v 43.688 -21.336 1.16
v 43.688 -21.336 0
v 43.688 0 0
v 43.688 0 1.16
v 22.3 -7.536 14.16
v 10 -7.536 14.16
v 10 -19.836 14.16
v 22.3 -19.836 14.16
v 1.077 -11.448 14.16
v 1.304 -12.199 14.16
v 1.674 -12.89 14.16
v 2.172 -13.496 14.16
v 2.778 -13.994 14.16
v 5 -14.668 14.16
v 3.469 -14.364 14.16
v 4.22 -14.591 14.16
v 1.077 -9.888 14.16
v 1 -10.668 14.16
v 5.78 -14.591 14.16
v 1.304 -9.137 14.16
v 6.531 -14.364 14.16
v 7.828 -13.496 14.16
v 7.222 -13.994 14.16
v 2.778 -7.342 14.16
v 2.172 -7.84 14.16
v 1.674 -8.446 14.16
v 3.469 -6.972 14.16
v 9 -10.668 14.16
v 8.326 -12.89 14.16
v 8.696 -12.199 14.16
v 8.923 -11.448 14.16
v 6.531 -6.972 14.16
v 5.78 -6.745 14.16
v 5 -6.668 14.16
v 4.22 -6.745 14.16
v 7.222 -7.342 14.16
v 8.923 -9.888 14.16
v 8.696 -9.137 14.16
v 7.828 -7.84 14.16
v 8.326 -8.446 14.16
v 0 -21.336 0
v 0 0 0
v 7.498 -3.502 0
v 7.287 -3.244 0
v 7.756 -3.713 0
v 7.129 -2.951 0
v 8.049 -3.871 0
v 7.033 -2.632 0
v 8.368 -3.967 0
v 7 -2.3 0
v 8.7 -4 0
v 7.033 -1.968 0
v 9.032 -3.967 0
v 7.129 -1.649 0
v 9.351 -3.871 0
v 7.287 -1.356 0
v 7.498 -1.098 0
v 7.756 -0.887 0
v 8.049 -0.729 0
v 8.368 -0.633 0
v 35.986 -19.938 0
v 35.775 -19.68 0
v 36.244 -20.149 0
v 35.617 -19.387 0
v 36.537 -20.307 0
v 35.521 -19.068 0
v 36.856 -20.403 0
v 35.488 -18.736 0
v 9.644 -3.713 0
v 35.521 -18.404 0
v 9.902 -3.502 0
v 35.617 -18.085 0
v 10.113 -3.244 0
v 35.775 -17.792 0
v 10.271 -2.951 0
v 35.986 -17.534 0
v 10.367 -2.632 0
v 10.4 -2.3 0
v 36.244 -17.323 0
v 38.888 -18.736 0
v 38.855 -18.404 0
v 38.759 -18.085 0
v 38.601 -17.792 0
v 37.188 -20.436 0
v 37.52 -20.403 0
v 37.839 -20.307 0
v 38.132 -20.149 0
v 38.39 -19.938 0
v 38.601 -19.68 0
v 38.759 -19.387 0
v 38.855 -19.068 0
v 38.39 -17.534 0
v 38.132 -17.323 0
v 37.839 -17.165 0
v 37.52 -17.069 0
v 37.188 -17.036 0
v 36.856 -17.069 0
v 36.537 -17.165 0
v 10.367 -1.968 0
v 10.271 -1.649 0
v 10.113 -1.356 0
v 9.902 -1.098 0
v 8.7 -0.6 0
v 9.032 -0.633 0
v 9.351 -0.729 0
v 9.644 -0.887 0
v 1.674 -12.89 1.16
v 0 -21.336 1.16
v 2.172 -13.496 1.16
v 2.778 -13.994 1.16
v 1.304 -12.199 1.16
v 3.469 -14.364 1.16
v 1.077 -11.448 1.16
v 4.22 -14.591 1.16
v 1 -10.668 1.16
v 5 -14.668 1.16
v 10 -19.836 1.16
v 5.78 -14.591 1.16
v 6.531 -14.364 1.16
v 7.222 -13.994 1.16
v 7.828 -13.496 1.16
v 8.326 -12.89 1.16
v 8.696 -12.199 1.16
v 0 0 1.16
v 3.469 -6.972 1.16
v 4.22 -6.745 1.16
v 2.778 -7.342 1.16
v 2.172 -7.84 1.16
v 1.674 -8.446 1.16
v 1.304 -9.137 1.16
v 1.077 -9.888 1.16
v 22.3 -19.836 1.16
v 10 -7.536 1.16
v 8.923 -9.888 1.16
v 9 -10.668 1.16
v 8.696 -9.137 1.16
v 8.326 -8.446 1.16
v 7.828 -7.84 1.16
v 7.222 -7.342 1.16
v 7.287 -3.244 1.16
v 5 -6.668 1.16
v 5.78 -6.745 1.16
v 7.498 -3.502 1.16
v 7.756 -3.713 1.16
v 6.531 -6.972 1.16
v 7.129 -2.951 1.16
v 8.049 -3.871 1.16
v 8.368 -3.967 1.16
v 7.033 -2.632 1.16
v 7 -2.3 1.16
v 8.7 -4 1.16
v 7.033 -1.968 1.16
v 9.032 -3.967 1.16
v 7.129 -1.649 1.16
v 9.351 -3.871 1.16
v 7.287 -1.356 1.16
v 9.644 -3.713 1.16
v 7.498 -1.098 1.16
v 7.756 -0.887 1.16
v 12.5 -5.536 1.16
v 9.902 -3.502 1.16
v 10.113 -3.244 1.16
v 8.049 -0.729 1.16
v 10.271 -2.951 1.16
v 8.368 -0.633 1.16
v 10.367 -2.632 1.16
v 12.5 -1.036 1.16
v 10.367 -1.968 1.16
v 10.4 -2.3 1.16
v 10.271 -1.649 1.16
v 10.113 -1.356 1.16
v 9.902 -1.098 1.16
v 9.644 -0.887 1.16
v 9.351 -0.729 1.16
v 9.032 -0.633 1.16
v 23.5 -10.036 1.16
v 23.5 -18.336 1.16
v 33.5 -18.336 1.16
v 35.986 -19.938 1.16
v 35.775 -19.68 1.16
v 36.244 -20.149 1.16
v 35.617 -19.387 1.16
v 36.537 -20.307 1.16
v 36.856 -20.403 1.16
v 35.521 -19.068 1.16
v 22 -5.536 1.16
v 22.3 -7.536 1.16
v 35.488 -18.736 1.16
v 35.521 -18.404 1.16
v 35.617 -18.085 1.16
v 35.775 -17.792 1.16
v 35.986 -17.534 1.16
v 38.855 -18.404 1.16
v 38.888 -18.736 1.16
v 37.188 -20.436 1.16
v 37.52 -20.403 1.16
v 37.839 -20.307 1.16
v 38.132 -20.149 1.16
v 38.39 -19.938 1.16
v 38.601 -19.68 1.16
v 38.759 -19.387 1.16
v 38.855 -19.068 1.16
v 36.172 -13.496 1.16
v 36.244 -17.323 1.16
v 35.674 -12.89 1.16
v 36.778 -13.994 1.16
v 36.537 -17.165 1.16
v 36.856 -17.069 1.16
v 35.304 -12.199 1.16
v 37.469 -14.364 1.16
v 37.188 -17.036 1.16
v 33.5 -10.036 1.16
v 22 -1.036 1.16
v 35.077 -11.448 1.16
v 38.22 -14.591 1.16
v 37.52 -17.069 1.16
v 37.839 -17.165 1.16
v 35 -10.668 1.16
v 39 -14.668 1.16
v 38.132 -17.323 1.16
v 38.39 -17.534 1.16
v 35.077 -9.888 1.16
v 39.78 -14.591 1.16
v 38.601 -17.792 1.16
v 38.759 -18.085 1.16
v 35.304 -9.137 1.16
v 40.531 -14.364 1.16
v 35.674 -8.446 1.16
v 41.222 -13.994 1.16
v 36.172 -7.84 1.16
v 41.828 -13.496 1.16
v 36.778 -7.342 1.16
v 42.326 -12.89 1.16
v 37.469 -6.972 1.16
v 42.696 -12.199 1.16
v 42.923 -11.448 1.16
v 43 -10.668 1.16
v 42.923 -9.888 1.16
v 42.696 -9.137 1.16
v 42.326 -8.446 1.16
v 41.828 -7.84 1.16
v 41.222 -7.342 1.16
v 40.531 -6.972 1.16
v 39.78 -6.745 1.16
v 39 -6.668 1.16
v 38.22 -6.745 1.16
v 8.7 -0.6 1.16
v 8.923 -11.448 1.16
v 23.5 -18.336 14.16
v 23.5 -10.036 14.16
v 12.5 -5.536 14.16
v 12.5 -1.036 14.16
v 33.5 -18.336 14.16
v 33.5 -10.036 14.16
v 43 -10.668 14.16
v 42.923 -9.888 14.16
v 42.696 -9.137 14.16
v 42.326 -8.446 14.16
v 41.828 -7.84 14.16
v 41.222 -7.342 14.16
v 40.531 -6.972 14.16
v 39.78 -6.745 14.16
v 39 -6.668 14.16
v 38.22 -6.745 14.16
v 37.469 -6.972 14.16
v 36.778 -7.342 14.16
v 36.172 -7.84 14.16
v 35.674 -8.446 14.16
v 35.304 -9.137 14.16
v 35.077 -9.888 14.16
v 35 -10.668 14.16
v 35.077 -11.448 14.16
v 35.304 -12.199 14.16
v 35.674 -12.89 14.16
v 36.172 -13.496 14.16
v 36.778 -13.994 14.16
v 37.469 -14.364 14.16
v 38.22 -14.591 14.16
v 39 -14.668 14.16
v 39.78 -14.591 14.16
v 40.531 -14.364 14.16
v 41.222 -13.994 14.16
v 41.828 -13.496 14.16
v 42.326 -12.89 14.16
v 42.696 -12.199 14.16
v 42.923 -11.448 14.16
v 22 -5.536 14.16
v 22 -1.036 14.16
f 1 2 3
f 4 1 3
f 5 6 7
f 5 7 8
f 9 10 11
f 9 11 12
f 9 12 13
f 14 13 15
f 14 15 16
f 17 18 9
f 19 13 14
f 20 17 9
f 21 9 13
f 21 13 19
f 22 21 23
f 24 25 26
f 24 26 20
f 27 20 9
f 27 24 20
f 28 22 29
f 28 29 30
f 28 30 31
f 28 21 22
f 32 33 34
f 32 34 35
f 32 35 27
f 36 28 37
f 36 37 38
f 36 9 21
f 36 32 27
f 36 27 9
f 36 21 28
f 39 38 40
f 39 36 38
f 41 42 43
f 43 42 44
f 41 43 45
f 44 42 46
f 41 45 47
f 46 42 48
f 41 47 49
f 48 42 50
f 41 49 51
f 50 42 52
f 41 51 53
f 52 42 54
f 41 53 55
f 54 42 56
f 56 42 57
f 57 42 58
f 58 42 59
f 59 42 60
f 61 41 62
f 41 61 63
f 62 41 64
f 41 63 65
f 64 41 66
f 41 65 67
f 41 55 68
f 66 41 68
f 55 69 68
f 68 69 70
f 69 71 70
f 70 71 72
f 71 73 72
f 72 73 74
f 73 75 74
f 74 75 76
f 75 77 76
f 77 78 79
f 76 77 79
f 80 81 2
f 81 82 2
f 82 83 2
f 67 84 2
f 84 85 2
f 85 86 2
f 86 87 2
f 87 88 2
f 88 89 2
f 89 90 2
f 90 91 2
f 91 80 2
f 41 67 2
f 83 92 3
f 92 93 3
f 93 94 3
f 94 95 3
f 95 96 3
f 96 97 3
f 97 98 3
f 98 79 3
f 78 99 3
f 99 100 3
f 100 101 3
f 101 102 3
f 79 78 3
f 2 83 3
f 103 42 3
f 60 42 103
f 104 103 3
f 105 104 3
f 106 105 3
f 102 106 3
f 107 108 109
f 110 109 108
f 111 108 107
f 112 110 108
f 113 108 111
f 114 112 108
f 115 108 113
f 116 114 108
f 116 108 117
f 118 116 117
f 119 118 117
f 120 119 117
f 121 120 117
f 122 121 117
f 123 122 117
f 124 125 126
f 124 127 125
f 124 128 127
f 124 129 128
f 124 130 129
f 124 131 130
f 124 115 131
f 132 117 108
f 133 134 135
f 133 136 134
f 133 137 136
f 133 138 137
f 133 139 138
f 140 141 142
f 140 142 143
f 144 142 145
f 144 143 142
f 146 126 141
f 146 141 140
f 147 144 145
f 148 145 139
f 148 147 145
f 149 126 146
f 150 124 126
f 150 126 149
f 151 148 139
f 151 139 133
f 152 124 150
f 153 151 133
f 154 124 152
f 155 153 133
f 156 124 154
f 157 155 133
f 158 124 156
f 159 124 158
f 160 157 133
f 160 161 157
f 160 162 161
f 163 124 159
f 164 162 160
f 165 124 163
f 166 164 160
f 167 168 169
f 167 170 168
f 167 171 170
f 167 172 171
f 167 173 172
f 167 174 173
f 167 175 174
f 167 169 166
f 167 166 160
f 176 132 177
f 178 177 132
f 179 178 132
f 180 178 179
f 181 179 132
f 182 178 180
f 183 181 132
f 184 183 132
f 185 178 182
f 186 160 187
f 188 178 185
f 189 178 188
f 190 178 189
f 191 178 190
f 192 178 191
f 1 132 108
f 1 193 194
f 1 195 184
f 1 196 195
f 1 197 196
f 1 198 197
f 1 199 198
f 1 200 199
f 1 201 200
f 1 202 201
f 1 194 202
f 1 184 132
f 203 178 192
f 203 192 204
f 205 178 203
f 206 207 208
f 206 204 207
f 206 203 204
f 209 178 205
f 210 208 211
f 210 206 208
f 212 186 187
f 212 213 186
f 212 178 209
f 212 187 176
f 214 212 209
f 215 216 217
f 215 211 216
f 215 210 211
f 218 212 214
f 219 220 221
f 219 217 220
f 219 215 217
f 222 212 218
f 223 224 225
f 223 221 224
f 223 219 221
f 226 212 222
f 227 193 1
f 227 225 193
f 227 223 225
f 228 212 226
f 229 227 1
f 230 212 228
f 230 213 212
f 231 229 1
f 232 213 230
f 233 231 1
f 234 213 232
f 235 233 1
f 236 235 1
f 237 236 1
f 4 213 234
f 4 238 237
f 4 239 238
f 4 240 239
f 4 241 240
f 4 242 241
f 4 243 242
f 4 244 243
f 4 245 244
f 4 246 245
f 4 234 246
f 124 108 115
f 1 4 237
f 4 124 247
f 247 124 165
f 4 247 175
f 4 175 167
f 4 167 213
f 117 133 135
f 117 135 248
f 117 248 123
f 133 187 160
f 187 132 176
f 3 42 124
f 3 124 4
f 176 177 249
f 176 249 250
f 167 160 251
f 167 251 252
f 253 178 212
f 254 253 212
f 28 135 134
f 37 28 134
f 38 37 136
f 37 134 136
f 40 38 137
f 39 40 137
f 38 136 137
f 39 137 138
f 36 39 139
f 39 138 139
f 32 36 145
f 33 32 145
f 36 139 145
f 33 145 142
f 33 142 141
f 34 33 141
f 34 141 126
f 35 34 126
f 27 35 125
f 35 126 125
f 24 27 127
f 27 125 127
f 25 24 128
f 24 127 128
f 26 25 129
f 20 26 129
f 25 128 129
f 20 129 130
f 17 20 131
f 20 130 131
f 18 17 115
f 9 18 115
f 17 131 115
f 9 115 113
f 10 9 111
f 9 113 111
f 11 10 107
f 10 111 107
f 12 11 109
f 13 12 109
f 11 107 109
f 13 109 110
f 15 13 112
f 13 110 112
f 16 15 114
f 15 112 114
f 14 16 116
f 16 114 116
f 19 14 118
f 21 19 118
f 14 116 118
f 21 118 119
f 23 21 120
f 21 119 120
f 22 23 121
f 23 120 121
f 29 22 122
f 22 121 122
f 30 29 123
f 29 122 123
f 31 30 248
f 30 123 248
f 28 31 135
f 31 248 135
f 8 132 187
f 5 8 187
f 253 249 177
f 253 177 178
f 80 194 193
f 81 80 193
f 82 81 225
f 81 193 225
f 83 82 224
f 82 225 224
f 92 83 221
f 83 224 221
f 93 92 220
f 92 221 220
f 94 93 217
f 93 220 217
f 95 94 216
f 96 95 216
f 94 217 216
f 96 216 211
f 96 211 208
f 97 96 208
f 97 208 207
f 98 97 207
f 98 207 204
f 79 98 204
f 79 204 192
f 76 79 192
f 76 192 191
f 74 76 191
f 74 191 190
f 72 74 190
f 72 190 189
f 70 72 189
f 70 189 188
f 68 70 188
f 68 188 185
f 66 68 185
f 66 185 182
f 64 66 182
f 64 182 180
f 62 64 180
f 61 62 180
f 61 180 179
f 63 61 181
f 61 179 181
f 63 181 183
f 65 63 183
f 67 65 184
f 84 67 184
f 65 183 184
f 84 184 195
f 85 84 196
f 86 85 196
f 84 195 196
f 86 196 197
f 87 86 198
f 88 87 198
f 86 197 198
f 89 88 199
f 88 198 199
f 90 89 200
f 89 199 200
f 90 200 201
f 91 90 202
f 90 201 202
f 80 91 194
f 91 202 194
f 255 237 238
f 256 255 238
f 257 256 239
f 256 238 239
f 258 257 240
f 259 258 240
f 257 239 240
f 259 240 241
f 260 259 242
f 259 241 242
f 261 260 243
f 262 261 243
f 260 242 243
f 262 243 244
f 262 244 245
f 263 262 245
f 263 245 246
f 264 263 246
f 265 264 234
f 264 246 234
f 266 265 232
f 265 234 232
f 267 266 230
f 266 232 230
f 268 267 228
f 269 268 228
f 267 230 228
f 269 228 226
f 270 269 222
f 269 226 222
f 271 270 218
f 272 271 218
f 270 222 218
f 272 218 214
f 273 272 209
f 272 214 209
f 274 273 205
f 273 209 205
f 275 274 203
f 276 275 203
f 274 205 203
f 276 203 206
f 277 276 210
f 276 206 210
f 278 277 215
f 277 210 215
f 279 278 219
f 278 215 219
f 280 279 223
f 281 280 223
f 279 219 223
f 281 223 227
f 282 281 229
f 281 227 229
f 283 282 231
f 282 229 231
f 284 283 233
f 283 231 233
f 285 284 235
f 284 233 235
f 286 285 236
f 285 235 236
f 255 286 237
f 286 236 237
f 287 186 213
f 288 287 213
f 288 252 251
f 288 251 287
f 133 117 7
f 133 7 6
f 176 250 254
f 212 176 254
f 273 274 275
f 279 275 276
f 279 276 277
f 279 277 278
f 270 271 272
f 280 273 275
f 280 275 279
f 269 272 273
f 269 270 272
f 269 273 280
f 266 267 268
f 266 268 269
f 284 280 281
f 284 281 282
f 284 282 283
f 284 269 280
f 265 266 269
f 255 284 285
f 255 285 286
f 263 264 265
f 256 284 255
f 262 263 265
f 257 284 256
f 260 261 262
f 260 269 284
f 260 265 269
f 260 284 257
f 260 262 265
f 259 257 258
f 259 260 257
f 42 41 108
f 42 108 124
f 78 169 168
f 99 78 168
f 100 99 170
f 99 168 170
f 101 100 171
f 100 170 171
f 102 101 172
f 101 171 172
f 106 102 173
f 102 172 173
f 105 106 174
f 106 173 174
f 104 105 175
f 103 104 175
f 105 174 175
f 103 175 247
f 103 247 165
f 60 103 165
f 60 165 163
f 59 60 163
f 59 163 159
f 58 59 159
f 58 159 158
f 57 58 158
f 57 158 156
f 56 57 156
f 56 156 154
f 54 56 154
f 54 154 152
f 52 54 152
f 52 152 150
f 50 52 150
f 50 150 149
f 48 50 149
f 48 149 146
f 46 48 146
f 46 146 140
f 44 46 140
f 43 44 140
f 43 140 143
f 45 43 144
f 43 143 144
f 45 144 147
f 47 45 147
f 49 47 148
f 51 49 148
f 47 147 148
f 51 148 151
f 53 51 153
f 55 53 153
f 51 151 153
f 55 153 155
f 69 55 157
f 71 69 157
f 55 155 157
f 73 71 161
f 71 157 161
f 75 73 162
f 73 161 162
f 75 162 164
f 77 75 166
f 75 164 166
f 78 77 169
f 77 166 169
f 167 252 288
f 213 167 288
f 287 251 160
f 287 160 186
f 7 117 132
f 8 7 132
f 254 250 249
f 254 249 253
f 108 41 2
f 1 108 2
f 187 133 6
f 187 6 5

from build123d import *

# Parameters (mm, degrees)
F0_W     = 43.688
F0_H     = 21.336
F1_DEPTH = 1.16
F2_R     = 1.7
F3_DEPTH = 25
F4_R     = 4
F4_W     = 12.3
F4_H     = 12.3
F4_W_2   = 10
F4_H_2   = 8.3
F4_W_3   = 9.5
F4_H_3   = 4.5
F5_DEPTH = 13


with BuildPart() as f1:
    # F0 (on Top) → F1 (new body)
    with BuildSketch(Plane.XY):
        with Locations((21.844, -10.668)):
            Rectangle(F0_W, F0_H)
    extrude(amount=F1_DEPTH)

    # F2 (on face) → F3 (cut)
    with BuildSketch(Plane.XY.offset(1.16)):
        with Locations((37.188, -18.736)):
            Circle(F2_R)
        with Locations((8.7, -2.3)):
            Circle(F2_R)
    extrude(amount=-F3_DEPTH, mode=Mode.SUBTRACT)

    # F4 (on face) → F5 (join)
    with BuildSketch(Plane.XY.offset(1.16)):
        with Locations((5, -10.668)):
            Circle(F4_R)
        with Locations((39, -10.668)):
            Circle(F4_R)
        with Locations((16.15, -13.686)):
            Rectangle(F4_W, F4_H)
        with Locations((28.5, -14.186)):
            Rectangle(F4_W_2, F4_H_2)
        with Locations((17.25, -3.286)):
            Rectangle(F4_W_3, F4_H_3)
    extrude(amount=F5_DEPTH)


solid = f1.part
